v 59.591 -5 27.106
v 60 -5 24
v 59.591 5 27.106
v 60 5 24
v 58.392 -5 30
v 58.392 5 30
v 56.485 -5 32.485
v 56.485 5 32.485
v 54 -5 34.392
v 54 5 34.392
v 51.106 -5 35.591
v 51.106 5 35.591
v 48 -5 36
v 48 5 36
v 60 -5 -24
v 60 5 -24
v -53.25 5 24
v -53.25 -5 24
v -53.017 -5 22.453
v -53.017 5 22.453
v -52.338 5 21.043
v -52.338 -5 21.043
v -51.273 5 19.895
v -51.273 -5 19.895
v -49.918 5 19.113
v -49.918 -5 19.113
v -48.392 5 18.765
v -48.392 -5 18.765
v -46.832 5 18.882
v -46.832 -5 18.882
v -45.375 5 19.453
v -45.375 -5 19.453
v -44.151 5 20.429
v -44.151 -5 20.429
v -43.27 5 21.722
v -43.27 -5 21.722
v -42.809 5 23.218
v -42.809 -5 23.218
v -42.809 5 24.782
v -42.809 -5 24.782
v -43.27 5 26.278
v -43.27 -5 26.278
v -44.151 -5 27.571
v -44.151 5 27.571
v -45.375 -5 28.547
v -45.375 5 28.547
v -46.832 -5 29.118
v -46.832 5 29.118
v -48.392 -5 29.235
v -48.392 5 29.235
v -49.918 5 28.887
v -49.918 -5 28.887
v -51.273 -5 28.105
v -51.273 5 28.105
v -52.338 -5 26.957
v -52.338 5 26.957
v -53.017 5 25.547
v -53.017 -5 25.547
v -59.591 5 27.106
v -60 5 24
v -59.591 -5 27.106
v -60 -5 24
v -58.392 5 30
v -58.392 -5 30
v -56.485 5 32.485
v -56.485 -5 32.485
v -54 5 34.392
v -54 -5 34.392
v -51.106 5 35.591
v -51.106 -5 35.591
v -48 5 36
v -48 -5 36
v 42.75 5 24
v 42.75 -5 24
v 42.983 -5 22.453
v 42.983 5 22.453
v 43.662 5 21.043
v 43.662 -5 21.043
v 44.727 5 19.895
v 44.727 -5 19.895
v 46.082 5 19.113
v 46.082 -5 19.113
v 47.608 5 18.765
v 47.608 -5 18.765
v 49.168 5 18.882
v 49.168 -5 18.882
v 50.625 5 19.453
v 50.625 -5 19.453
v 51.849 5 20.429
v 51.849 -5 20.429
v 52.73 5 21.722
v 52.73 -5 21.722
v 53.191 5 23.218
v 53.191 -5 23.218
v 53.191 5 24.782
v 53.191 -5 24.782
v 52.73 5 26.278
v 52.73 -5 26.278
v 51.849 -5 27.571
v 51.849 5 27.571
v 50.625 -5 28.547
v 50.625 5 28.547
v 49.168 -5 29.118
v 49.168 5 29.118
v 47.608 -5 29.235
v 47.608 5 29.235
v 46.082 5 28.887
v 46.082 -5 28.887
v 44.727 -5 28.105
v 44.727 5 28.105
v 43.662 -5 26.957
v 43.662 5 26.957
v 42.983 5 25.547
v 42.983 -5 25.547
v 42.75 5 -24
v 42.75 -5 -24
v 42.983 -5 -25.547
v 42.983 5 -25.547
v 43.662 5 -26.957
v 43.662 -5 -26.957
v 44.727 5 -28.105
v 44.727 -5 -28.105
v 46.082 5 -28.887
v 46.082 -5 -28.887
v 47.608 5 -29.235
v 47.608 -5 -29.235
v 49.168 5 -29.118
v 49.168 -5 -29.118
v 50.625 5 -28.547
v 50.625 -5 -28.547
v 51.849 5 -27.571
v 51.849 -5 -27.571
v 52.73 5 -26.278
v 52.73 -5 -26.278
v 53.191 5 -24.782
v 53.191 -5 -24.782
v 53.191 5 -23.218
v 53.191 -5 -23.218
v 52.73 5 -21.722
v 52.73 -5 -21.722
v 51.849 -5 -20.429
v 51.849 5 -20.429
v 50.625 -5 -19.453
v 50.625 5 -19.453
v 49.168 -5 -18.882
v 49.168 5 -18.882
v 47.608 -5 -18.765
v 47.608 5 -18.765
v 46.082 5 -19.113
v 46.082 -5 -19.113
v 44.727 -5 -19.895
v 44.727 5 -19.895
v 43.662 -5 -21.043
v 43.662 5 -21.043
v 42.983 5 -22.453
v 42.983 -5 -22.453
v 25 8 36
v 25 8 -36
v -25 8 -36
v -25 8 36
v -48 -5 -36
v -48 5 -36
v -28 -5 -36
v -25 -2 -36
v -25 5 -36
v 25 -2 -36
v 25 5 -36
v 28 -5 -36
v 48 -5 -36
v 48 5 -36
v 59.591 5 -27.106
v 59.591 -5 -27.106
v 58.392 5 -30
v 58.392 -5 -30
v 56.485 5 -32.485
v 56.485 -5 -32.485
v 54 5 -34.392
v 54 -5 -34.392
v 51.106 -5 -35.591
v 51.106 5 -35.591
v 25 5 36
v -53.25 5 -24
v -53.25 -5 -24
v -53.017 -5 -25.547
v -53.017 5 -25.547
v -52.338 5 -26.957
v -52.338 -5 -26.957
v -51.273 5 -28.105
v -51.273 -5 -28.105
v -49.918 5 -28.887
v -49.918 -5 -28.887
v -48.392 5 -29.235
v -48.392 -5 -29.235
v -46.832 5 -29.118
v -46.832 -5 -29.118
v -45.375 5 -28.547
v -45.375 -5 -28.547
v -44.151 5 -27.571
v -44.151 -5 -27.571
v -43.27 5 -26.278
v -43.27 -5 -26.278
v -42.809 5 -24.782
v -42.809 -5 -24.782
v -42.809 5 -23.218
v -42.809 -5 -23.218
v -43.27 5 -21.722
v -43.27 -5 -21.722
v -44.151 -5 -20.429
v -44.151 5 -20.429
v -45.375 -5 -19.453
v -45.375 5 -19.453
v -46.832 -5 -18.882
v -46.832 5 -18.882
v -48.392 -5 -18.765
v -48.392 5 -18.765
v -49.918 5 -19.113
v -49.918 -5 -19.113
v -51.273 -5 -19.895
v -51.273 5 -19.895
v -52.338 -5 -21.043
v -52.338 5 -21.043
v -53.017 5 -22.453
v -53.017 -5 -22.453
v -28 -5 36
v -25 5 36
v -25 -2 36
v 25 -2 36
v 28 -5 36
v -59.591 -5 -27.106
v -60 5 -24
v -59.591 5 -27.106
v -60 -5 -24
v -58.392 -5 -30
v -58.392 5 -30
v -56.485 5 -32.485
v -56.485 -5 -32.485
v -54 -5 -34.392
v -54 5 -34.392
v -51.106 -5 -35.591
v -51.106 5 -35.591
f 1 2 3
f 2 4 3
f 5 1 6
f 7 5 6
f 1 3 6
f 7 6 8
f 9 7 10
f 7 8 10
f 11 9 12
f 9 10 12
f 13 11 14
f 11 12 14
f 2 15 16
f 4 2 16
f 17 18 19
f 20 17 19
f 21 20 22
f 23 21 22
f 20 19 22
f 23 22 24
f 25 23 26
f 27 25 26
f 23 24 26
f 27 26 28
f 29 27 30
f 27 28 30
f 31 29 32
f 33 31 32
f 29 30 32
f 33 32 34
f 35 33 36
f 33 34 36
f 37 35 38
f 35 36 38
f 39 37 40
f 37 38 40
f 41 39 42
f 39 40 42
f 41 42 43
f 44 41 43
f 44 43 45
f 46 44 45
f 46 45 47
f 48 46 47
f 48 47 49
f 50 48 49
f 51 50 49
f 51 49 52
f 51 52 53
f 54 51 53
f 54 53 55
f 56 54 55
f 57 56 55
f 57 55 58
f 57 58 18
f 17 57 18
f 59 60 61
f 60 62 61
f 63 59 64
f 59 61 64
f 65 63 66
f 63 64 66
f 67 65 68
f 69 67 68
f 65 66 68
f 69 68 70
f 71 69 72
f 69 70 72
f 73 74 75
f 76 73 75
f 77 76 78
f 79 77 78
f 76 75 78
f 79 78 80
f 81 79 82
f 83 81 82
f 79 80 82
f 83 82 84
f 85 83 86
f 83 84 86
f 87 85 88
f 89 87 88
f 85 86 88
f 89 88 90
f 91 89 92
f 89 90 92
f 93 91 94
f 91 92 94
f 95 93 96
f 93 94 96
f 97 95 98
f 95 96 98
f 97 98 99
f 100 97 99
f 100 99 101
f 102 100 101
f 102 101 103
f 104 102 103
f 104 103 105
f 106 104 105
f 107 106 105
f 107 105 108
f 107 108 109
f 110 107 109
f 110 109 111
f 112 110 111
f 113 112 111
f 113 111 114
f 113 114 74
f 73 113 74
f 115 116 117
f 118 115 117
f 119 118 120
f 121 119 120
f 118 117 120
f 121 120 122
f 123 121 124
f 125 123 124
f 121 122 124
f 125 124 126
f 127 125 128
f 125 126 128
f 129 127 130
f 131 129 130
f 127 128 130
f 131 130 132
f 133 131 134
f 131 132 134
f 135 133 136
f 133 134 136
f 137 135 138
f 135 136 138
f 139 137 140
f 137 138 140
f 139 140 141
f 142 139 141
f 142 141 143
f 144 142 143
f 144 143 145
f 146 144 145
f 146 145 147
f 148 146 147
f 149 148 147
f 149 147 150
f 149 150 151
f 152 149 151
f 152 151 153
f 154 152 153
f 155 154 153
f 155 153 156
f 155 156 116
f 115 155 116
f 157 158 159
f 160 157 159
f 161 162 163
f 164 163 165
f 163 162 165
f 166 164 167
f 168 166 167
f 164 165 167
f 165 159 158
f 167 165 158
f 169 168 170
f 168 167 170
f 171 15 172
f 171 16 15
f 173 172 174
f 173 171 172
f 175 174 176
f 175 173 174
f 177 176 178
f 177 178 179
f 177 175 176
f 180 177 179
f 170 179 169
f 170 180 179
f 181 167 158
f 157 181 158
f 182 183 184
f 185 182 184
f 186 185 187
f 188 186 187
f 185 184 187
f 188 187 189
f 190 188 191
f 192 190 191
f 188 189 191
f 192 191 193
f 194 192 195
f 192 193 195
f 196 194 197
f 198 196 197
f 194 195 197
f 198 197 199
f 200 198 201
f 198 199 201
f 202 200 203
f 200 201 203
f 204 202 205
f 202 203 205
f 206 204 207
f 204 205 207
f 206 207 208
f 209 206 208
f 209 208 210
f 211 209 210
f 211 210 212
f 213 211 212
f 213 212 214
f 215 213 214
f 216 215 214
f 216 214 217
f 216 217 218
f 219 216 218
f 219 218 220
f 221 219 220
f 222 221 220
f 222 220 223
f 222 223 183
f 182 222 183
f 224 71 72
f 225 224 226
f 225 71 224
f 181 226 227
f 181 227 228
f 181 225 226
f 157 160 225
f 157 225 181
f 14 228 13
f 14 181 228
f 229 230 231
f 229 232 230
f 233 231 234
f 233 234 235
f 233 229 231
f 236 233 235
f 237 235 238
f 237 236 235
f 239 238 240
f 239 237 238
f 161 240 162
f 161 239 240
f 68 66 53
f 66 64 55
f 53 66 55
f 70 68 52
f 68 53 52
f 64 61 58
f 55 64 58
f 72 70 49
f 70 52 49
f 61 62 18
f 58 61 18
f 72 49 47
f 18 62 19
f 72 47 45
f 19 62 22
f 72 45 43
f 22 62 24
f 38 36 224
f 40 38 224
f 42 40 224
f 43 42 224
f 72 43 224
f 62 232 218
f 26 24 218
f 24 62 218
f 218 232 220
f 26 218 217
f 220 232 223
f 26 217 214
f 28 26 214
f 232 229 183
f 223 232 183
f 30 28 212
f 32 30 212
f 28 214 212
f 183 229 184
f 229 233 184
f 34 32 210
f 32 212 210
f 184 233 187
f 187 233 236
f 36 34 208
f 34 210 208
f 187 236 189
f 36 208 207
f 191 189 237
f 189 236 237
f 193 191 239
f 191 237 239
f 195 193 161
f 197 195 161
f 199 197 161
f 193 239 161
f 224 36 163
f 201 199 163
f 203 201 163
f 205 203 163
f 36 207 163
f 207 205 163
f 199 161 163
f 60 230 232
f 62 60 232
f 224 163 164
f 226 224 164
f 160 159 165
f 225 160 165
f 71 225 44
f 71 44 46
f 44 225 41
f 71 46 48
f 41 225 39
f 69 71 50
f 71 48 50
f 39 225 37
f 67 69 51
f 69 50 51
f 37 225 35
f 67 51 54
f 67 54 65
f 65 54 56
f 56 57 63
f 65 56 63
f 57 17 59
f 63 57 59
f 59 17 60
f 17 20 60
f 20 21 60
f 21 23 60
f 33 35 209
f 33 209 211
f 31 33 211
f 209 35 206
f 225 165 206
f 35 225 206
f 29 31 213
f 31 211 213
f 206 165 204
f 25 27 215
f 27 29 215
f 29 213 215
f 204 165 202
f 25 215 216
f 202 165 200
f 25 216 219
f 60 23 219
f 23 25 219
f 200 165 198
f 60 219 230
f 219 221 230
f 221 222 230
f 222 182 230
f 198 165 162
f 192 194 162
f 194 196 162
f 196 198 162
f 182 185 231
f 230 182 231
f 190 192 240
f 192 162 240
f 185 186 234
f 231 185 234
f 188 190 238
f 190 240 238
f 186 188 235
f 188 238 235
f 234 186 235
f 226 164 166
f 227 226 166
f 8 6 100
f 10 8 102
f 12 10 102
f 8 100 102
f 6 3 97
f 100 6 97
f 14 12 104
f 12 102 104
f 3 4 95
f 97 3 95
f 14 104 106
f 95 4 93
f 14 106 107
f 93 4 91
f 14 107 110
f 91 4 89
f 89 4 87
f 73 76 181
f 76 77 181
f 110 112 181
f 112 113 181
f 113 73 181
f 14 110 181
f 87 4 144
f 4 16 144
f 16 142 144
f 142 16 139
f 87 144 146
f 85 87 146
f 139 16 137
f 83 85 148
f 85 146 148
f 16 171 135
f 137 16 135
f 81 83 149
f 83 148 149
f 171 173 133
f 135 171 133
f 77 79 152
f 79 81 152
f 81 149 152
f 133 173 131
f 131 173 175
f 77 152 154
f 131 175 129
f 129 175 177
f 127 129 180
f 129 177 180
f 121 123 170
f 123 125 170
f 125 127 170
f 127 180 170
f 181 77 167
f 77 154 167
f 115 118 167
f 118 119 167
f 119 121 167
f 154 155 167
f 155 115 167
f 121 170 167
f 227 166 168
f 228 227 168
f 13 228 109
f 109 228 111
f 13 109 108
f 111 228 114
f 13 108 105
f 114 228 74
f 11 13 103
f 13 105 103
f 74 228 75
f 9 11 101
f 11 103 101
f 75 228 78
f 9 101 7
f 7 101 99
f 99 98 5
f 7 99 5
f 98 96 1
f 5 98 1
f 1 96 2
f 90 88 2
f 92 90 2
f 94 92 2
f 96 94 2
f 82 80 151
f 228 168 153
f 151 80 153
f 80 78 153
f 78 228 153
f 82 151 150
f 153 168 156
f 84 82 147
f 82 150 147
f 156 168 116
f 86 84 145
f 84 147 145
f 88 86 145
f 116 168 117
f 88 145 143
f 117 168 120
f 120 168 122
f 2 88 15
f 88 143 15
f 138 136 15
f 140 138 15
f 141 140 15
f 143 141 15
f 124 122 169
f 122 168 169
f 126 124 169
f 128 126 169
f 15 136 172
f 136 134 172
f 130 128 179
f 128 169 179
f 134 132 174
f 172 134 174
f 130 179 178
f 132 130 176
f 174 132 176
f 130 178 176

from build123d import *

# Parameters (mm, degrees)
BOSS_EXTRUDE1_DEPTH      = 36
BOSS_EXTRUDE1_DEPTH_BACK = 36
FILLET1_R                = 12
M12X1_5_TAPPED_HOLE1_D   = 10.5


with BuildPart() as part:
    # Sketch1 → Boss-Extrude1 (new, two sides: drawn at the far end of the back side and taken through both)
    with BuildSketch(Plane.XY.offset(-BOSS_EXTRUDE1_DEPTH_BACK)):
        Polygon((-25, 8), (-25, 5), (-60, 5), (-60, -5), (-28, -5), (-25, -2), (25, -2), (28, -5), (60, -5), (60, 5), (25, 5), (25, 8), align=None)
    extrude(amount=BOSS_EXTRUDE1_DEPTH + BOSS_EXTRUDE1_DEPTH_BACK)

    # Fillet1
    fillet1_edges = [part.edges().sort_by_distance(p)[0] for p in [
        (-60, 0, -36),
        (-60, 0, 36),
        (60, 0, -36),
        (60, 0, 36),
    ]]
    fillet(fillet1_edges, radius=FILLET1_R)

    # M12x1.5 Tapped Hole1 (through all)
    with Locations(Plane(origin=(0, 5, 0), x_dir=(1, 0, 0), z_dir=(0, 1, 0))):
        with Locations((-48, -24), (-48, 24), (48, 24), (48, -24)):
            Hole(M12X1_5_TAPPED_HOLE1_D / 2)


solid = part.part
